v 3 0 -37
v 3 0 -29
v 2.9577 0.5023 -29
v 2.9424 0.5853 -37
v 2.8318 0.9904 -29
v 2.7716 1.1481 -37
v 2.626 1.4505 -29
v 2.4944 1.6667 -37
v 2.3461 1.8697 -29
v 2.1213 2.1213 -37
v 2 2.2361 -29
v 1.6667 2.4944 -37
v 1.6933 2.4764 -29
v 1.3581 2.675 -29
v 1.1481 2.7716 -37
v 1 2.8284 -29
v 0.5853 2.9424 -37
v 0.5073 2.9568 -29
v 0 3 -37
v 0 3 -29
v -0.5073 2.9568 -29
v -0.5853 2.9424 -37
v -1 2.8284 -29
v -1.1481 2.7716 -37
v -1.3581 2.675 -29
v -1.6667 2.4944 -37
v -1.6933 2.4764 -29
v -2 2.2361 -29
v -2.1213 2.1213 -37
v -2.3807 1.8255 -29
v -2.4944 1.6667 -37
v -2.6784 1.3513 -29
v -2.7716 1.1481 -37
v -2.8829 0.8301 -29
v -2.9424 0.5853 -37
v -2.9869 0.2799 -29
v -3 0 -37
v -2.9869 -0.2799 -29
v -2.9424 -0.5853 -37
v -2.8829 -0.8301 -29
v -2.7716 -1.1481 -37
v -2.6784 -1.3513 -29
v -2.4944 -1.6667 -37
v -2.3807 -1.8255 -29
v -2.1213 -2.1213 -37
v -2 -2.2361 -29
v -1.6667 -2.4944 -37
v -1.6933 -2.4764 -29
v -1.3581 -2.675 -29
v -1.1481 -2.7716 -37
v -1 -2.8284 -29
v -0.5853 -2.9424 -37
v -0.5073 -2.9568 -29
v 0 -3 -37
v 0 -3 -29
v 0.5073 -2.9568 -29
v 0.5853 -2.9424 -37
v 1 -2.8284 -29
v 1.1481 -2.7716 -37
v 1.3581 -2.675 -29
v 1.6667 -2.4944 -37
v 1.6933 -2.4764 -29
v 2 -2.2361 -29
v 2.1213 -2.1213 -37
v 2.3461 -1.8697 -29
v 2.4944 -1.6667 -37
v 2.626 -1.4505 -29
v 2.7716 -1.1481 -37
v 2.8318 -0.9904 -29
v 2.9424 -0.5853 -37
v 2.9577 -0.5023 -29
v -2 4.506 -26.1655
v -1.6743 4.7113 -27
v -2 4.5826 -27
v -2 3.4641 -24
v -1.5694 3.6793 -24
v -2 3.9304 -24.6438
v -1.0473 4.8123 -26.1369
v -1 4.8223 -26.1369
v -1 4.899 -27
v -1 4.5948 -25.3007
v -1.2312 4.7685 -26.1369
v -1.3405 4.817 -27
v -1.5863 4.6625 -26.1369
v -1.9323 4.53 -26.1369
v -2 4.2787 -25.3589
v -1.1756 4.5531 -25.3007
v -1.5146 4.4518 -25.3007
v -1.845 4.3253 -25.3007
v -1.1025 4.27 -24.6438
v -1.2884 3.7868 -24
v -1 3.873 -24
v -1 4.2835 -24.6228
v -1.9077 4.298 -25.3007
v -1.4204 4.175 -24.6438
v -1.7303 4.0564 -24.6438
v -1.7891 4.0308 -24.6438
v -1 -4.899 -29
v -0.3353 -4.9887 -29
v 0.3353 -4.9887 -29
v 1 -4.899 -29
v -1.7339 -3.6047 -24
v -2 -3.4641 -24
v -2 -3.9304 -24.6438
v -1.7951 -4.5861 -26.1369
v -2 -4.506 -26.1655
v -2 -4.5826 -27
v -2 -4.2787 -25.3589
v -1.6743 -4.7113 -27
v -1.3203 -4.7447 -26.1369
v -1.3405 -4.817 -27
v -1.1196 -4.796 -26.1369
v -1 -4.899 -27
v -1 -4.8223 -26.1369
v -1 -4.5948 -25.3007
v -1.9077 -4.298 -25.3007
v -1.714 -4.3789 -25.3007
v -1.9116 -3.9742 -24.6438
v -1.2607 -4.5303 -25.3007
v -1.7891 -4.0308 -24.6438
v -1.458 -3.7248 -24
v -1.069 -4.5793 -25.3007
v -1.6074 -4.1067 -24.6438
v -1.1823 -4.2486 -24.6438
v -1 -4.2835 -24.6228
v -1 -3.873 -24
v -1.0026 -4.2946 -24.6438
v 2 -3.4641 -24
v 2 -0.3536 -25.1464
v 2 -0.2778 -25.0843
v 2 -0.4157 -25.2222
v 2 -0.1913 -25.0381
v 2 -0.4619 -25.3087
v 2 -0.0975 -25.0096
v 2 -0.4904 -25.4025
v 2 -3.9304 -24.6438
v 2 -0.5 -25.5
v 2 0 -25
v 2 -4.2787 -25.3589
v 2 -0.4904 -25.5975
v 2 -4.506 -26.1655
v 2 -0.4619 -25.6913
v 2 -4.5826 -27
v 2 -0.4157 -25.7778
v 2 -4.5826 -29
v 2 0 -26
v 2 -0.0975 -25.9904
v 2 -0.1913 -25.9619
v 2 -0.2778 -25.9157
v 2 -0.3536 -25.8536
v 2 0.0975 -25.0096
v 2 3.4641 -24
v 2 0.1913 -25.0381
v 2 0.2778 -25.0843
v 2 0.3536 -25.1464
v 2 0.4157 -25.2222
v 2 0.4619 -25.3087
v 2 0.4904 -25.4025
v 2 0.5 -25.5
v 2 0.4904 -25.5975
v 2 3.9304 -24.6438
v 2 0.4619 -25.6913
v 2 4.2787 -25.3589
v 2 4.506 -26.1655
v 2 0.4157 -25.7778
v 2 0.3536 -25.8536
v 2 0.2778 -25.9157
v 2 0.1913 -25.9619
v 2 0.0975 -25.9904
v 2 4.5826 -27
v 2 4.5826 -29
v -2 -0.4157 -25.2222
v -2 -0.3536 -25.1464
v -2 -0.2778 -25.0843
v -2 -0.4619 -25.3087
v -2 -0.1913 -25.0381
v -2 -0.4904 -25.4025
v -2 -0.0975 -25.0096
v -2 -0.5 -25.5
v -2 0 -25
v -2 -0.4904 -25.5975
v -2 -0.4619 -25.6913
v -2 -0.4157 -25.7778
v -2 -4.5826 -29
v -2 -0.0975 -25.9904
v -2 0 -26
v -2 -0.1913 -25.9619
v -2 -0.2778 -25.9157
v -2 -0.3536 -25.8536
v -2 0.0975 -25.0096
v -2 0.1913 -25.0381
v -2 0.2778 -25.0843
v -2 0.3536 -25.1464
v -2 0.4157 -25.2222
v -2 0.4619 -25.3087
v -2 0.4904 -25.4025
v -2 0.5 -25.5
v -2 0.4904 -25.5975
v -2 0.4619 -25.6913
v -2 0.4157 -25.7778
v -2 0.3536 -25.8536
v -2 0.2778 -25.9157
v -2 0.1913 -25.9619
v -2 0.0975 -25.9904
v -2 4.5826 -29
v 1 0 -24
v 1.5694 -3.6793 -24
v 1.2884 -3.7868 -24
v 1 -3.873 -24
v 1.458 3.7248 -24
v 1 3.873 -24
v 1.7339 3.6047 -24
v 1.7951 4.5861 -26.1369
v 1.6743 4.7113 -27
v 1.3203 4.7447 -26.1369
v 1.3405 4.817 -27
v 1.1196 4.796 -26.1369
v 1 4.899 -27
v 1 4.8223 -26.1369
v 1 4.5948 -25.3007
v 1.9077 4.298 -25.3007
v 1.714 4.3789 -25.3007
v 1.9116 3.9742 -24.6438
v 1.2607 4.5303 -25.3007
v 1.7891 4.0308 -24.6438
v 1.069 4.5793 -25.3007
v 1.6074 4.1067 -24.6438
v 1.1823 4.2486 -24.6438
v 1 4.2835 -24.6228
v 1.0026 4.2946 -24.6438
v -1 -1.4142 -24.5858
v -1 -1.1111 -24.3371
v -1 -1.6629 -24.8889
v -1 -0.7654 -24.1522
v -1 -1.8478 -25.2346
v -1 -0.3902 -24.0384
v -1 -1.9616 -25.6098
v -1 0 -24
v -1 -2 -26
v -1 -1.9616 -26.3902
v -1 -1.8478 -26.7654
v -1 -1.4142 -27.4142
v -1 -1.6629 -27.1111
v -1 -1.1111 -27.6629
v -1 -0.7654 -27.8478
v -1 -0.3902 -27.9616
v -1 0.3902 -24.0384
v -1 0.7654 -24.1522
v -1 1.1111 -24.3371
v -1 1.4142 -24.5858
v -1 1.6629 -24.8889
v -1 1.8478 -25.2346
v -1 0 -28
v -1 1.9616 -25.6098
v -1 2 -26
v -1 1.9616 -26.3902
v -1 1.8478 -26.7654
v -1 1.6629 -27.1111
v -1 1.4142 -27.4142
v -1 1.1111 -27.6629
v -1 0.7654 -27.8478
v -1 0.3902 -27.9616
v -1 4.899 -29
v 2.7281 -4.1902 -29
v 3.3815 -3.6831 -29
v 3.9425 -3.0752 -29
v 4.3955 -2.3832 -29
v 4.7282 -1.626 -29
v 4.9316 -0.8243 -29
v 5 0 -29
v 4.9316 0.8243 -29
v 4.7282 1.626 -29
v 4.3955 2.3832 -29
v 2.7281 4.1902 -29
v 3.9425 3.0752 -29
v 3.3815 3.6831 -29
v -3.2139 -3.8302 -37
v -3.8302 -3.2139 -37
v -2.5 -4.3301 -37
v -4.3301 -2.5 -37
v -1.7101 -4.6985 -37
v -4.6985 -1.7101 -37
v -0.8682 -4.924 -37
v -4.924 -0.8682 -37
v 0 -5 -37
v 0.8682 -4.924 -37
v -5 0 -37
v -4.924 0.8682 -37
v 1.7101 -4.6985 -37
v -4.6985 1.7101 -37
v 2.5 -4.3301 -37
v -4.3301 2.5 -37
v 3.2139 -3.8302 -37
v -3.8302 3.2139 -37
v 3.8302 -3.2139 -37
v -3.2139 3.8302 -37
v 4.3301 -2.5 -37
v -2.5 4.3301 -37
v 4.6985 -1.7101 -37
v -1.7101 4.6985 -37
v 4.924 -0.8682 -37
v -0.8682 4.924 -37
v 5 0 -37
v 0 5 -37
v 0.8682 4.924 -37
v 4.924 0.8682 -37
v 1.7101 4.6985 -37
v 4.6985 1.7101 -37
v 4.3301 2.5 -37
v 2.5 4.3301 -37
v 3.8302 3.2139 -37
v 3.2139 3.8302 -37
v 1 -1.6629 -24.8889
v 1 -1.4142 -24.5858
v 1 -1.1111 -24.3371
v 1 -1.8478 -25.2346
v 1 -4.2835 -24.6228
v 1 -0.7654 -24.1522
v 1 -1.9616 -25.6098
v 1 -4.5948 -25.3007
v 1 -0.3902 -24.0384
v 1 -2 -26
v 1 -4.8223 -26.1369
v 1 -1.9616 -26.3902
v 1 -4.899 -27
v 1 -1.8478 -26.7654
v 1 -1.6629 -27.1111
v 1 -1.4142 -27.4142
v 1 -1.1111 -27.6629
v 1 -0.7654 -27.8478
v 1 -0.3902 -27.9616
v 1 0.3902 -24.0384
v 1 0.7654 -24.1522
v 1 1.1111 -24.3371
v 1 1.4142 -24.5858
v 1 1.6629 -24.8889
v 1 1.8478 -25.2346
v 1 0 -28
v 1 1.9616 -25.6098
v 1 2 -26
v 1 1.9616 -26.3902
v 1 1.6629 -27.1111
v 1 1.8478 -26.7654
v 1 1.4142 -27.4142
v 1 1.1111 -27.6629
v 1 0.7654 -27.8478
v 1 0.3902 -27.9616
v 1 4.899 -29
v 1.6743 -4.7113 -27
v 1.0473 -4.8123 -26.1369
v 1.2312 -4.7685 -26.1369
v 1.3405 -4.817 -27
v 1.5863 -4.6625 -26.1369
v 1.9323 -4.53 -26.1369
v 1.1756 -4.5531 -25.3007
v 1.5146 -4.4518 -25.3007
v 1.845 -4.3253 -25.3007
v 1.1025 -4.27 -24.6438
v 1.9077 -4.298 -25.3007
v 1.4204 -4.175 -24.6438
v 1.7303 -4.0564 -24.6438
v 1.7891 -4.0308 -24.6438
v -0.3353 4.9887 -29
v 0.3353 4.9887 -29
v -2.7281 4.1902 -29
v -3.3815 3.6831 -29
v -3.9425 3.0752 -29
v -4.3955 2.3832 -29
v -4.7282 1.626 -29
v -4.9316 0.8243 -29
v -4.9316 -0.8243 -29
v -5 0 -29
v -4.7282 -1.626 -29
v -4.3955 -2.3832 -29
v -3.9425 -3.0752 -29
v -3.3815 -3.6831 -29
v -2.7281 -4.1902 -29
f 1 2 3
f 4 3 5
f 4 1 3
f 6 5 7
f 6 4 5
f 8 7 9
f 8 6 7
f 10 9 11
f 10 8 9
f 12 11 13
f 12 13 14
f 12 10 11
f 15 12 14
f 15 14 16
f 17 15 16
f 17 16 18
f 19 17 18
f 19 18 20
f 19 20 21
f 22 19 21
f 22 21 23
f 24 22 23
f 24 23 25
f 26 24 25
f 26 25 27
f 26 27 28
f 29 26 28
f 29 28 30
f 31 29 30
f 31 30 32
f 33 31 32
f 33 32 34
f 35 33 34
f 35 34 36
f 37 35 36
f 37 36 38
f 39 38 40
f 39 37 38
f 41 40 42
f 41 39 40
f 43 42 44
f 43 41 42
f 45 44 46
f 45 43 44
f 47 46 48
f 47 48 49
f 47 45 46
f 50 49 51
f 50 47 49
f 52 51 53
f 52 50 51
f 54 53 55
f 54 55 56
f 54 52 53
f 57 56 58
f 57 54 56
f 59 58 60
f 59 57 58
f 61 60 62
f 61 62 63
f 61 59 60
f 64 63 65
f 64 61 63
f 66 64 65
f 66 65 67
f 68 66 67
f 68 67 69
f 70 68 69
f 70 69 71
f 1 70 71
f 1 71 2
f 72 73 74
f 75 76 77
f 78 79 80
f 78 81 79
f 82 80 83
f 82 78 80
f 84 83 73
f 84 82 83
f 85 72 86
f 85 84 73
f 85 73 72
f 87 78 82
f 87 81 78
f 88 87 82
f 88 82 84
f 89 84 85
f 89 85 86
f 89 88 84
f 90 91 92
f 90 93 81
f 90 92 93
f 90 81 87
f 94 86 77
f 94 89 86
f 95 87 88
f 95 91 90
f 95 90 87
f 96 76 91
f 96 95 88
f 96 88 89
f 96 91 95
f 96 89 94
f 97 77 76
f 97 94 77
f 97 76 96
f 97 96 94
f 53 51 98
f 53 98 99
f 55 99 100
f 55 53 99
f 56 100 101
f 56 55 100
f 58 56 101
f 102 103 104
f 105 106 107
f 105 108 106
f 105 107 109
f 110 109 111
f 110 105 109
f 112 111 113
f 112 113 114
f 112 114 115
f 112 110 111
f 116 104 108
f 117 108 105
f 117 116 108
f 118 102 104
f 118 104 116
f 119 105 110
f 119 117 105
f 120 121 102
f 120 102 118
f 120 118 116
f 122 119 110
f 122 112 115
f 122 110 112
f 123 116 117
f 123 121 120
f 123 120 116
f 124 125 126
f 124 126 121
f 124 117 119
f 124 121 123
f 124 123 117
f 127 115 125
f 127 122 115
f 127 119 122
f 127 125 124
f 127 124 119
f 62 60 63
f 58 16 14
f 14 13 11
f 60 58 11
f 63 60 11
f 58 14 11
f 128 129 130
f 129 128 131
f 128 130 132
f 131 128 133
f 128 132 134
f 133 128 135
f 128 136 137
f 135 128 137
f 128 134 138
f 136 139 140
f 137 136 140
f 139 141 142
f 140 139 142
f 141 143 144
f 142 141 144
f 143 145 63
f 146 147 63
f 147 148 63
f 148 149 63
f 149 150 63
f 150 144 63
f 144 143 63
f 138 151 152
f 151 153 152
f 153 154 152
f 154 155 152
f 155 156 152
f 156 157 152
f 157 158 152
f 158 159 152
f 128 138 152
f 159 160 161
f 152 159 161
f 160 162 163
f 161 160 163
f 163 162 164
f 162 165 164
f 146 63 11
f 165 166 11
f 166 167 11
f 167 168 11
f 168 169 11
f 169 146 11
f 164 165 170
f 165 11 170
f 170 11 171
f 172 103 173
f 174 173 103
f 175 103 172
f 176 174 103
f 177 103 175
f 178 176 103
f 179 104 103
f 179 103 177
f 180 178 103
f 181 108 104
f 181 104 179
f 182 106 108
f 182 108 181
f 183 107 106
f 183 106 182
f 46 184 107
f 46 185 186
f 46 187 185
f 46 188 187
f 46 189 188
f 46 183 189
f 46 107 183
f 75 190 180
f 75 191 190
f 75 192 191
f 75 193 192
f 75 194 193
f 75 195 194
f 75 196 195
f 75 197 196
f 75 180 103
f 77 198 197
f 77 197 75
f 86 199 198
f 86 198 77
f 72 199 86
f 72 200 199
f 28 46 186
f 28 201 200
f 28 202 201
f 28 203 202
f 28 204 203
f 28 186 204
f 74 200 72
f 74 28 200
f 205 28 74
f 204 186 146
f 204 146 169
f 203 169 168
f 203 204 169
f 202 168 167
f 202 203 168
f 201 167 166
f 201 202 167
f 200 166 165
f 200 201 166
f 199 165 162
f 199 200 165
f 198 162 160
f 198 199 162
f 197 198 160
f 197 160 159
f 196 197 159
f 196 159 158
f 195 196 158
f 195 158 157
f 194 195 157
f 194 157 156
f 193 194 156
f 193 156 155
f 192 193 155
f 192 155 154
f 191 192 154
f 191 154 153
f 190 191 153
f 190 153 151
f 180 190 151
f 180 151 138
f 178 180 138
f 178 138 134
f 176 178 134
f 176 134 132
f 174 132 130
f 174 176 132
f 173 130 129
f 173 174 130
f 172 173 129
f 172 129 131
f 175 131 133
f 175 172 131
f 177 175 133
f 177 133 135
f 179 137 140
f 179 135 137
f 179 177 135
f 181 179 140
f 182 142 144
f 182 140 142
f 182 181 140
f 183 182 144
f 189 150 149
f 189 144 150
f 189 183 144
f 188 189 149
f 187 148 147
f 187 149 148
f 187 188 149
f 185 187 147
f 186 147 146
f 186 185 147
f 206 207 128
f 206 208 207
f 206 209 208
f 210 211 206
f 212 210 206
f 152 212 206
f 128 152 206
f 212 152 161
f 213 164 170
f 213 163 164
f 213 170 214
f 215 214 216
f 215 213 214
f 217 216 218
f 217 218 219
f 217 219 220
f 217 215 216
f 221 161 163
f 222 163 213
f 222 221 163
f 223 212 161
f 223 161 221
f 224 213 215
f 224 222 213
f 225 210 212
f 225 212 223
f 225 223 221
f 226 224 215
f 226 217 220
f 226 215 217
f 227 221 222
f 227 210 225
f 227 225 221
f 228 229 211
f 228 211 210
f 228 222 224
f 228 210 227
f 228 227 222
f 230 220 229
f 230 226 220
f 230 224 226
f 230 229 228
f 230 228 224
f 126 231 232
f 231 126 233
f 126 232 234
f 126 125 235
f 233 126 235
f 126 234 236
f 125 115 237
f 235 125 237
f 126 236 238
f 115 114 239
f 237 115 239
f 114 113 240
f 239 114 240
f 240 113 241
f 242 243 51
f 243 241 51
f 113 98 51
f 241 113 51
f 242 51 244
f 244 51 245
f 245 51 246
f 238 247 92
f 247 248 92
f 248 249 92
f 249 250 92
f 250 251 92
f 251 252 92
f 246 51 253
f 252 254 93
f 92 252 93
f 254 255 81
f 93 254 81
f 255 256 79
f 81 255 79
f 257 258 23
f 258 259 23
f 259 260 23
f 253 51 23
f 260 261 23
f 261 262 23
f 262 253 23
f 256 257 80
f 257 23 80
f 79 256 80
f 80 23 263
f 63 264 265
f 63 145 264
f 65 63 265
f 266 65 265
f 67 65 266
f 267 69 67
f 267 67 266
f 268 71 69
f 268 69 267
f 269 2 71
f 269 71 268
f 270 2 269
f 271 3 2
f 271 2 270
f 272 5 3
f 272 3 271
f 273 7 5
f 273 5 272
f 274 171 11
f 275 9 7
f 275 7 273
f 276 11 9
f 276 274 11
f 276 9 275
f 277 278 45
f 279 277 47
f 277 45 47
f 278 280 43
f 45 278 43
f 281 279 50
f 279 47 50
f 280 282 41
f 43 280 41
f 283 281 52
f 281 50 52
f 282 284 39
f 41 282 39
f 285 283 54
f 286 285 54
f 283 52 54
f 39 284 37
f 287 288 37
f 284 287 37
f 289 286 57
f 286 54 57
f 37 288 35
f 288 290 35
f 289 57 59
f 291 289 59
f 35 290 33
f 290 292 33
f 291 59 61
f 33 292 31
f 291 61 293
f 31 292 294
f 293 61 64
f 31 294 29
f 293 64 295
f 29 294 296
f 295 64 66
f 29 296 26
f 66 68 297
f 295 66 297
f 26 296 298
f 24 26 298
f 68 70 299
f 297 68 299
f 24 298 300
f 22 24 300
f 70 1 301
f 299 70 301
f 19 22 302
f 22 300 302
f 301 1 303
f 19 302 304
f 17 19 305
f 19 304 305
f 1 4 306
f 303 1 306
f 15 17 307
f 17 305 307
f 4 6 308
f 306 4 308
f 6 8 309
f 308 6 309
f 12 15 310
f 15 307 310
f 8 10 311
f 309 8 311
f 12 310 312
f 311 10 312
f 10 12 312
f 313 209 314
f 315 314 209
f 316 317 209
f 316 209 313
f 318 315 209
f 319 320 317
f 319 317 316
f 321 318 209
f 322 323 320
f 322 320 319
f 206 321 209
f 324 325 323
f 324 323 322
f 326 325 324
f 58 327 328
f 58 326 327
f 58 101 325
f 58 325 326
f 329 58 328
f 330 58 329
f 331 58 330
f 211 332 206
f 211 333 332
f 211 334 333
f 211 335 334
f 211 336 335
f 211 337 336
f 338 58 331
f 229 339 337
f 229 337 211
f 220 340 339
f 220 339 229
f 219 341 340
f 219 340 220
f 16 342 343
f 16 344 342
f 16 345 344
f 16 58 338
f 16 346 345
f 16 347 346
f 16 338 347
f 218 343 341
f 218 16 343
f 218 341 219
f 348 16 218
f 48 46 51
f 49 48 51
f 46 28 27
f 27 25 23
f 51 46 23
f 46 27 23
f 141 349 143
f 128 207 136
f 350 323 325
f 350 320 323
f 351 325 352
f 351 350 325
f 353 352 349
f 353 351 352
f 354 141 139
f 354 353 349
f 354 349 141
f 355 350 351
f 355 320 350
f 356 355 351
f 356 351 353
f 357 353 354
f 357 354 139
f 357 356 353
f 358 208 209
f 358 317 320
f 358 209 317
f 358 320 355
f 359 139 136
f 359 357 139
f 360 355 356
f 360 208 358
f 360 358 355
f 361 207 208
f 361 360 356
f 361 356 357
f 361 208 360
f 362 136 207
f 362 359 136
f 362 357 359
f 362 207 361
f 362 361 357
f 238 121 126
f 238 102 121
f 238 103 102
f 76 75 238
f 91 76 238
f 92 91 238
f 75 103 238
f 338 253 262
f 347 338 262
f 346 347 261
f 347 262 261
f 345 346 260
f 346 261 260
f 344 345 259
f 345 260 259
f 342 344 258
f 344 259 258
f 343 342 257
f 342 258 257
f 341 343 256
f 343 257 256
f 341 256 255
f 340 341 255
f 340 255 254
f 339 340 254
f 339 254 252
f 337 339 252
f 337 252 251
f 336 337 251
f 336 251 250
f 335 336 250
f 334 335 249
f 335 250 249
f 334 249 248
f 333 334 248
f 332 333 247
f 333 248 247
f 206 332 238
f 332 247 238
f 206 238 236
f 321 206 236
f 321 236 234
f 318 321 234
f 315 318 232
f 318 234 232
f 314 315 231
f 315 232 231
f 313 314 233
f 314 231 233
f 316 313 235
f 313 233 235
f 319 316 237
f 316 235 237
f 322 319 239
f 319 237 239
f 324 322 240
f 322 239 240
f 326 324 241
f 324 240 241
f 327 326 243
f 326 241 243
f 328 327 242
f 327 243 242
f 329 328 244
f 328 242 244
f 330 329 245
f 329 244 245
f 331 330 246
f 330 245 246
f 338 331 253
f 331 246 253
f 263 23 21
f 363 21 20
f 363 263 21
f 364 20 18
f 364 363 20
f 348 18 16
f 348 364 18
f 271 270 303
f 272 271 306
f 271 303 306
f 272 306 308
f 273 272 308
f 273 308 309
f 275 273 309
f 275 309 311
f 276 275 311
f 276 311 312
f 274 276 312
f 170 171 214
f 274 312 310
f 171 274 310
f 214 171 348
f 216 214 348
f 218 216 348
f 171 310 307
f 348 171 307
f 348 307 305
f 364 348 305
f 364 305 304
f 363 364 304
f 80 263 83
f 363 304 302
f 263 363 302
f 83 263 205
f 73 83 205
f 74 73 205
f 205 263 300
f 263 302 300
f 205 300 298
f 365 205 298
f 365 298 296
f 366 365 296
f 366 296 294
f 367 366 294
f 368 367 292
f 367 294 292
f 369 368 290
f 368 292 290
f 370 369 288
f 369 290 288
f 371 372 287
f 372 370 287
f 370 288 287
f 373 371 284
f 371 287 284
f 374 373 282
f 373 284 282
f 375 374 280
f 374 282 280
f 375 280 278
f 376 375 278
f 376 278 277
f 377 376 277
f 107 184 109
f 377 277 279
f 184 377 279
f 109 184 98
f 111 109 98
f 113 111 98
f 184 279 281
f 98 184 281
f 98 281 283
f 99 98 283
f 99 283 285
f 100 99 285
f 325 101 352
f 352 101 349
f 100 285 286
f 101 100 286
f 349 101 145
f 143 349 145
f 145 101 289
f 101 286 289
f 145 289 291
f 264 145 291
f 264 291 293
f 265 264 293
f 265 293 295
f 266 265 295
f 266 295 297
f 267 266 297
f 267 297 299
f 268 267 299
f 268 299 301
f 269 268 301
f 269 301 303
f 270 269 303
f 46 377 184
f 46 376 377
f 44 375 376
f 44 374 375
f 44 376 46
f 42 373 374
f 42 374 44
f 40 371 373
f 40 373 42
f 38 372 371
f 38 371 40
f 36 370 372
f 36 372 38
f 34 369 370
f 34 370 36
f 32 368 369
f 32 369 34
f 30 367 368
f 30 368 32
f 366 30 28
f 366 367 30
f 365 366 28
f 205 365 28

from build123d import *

# Parameters (mm, degrees)
CYLINDER016_R     = 0.5
CYLINDER016_DEPTH = 10
CYLINDER014_R     = 2
CYLINDER014_DEPTH = 4
CYLINDER015_R     = 3
CYLINDER015_DEPTH = 10
BOX003_W          = 10
BOX003_H          = 10
BOX003_DEPTH      = 10
BOX004_W          = 2
BOX004_H          = 10
BOX004_DEPTH      = 10
BOX002_W          = 10
BOX002_H          = 10
BOX002_DEPTH      = 10
CYLINDER013_R     = 5
CYLINDER013_DEPTH = 10
CYLINDER012_R     = 5
CYLINDER012_DEPTH = 10


with BuildPart() as cylinder016:
    # Cylinder016 → Cylinder016 (new body)
    with BuildSketch(Plane(origin=(-5, 0, -7), x_dir=(0, 0, -1), z_dir=(1, 0, 0))):
        Circle(CYLINDER016_R)
    extrude(amount=CYLINDER016_DEPTH)


with BuildPart() as cylinder014:
    # Cylinder014 → Cylinder014 (new body)
    with BuildSketch(Plane(origin=(-2, -50, 1), x_dir=(0, 0, -1), z_dir=(1, 0, 0))):
        Circle(CYLINDER014_R)
    extrude(amount=CYLINDER014_DEPTH)


with BuildPart() as cylinder015:
    # Cylinder015 → Cylinder015 (new body)
    with BuildSketch(Plane(origin=(0, -50, -12), x_dir=(1, 0, 0), z_dir=(0, 0, 1))):
        Circle(CYLINDER015_R)
    extrude(amount=CYLINDER015_DEPTH)


with BuildPart() as cube003:
    # Box003 → Box003 (new body)
    with BuildSketch(Plane(origin=(-12, -55, -2), x_dir=(1, 0, 0), z_dir=(0, 0, 1))):
        with Locations((5, 5)):
            Rectangle(BOX003_W, BOX003_H)
    extrude(amount=BOX003_DEPTH)


with BuildPart() as cube004:
    # Box004 → Box004 (new body)
    with BuildSketch(Plane(origin=(-1, -55, -2), x_dir=(1, 0, 0), z_dir=(0, 0, 1))):
        with Locations((1, 5)):
            Rectangle(BOX004_W, BOX004_H)
    extrude(amount=BOX004_DEPTH)


with BuildPart() as cube002:
    # Box002 → Box002 (new body)
    with BuildSketch(Plane(origin=(2, -55, -2), x_dir=(1, 0, 0), z_dir=(0, 0, 1))):
        with Locations((5, 5)):
            Rectangle(BOX002_W, BOX002_H)
    extrude(amount=BOX002_DEPTH)


with BuildPart() as cylinder013:
    # Cylinder013 → Cylinder013 (new body)
    with BuildSketch(Plane(origin=(0, -50, -10), x_dir=(1, 0, 0), z_dir=(0, 0, 1))):
        Circle(CYLINDER013_R)
    extrude(amount=CYLINDER013_DEPTH)


with BuildPart() as sphere004:
    # Sphere004 → Sphere004 (revolve)
    with BuildSketch(Plane.XZ.offset(50)):
        with BuildLine():
            ThreePointArc((5, 0), (3.535534, 3.535534), (0, 5))
            Line((0, 5), (0, 0))
            Line((0, 0), (5, 0))
        make_face()
    revolve(axis=Axis((0, -50, 0), (0, 0, 1)))


with BuildPart() as cut013:
    # Cylinder012 → Cylinder012 (new body)
    with BuildSketch(Plane(origin=(0, -50, -7), x_dir=(1, 0, 0), z_dir=(0, 0, 1))):
        Circle(CYLINDER012_R)
    extrude(amount=CYLINDER012_DEPTH)

    # Common002: intersect Sphere004
    add(sphere004.part, mode=Mode.INTERSECT)

    # Fusion004: union Cylinder013
    add(cylinder013.part)

    # Cut009: cut Cube002
    add(cube002.part, mode=Mode.SUBTRACT)

    # Cut010: cut Cube004
    add(cube004.part, mode=Mode.SUBTRACT)

    # Cut011: cut Cube003
    add(cube003.part, mode=Mode.SUBTRACT)

    # Cut012: cut Cylinder015
    add(cylinder015.part, mode=Mode.SUBTRACT)

    # Fusion005: union Cylinder014
    add(cylinder014.part)


with BuildPart() as cut013_1:
    # Fusion005001 placement: moved
    add(cut013.part.moved(Location((0, 50, -8.5))))

    # Cut013: cut Cylinder016
    add(cylinder016.part, mode=Mode.SUBTRACT)


with BuildPart() as cut013_2:
    # Cut013 placement: moved
    add(cut013_1.part.moved(Location((0, 0, -18.5))))


solid = cut013_2.part
